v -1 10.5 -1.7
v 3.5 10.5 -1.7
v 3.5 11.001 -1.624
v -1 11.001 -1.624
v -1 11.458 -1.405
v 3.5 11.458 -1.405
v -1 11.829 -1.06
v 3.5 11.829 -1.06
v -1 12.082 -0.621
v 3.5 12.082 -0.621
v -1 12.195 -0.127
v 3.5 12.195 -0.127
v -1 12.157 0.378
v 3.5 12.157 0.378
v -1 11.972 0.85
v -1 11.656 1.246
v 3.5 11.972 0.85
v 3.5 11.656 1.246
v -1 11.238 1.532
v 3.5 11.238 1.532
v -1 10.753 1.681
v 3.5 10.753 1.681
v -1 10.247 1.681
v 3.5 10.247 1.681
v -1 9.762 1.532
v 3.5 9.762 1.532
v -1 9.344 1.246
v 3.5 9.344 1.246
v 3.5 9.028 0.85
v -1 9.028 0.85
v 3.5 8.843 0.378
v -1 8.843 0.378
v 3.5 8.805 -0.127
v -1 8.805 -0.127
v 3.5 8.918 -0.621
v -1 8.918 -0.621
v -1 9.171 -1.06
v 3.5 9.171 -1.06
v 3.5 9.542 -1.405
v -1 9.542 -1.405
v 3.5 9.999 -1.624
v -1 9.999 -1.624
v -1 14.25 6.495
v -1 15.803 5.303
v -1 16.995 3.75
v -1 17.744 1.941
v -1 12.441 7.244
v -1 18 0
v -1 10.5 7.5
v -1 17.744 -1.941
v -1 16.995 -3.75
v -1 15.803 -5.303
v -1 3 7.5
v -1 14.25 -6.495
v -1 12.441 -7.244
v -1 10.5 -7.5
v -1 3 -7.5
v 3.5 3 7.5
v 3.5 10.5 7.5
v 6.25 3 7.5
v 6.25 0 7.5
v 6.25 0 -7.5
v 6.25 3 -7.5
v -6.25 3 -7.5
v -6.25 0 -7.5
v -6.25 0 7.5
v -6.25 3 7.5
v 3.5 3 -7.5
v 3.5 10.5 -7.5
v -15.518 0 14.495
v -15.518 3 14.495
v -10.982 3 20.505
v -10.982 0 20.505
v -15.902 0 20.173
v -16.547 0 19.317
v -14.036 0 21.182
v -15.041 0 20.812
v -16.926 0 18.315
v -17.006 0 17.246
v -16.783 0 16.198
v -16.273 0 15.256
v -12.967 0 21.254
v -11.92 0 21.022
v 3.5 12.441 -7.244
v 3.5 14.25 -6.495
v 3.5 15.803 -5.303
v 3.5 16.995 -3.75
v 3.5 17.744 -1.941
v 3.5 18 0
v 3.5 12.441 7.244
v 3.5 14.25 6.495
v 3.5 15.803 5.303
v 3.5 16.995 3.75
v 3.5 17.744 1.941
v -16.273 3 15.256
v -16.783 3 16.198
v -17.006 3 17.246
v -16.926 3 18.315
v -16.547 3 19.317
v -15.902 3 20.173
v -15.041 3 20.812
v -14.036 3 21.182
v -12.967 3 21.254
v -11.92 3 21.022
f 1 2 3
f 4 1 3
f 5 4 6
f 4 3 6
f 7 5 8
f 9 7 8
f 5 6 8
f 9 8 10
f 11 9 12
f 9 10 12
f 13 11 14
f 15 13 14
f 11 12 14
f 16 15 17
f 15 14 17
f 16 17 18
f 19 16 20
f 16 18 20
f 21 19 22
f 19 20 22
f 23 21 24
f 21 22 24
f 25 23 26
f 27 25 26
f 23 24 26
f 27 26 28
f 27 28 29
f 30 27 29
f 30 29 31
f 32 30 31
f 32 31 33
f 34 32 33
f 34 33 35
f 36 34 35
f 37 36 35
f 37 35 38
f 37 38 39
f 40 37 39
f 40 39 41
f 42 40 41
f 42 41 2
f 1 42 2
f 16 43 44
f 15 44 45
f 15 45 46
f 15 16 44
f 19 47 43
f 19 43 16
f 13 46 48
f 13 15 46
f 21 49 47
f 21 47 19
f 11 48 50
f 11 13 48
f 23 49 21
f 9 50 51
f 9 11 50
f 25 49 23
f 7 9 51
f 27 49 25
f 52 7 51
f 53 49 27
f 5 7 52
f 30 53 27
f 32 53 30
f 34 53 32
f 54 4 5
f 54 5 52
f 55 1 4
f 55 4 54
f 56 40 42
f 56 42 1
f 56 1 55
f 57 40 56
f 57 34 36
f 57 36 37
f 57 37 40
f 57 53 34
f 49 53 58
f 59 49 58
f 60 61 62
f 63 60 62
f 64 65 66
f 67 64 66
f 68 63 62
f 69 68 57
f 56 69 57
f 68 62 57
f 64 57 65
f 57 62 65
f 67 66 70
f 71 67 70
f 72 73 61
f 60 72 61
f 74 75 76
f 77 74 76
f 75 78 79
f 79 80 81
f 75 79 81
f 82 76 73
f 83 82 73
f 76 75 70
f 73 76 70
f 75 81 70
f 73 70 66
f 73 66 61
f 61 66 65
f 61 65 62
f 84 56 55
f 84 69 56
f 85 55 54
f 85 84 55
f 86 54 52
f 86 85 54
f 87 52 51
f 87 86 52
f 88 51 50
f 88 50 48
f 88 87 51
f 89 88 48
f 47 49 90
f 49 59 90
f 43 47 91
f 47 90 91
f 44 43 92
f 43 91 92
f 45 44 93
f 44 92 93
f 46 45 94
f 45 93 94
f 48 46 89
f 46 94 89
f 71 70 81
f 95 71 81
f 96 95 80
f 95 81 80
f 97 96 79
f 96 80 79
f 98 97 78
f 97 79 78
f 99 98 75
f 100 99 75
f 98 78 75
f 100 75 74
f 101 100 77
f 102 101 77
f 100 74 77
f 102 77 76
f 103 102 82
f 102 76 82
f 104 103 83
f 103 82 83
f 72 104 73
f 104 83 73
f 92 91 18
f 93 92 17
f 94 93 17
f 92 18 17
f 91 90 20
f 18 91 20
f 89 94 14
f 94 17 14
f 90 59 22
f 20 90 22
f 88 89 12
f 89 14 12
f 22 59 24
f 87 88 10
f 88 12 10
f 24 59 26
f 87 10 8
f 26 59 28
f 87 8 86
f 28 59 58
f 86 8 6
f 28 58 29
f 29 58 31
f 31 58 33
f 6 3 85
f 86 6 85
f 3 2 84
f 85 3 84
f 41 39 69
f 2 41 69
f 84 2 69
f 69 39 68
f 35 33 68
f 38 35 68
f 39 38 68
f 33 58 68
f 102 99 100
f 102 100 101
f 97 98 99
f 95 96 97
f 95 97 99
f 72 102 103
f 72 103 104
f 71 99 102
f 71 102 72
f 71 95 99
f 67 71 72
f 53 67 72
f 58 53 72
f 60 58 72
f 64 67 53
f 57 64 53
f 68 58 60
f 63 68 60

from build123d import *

# Parameters (mm, degrees)
BOSS_EXTRUDE1_DEPTH = 3
SKETCH2_W           = 4.5
SKETCH2_H           = 15
BOSS_EXTRUDE2_DEPTH = 15
CUT_EXTRUDE1_REACH  = 36.599
SKETCH3_R           = 1.7
FILLET1_R           = 7.5


with BuildPart() as part:
    # Sketch1 → Boss-Extrude1 (new body)
    with BuildSketch(Plane(origin=(0, 0, 0), x_dir=(1, 0, 0), z_dir=(0, 1, 0))):
        with BuildLine():
            Line((-6.25, -7.5), (-15.518088002, -14.494783398))
            ThreePointArc((-15.518088002, -14.494783398), (-16.255216602, -19.768088002), (-10.981911998, -20.505216602))
            Line((-10.981911998, -20.505216602), (6.25, -7.5))
            Line((6.25, -7.5), (6.25, 7.5))
            Line((6.25, 7.5), (-6.25, 7.5))
            Line((-6.25, 7.5), (-6.25, -7.5))
        make_face()
    extrude(amount=BOSS_EXTRUDE1_DEPTH)

    # Sketch2 → Boss-Extrude2 (add)
    with BuildSketch(Plane(origin=(0, 3, 0), x_dir=(1, 0, 0), z_dir=(0, 1, 0))):
        with Locations((1.25, 0)):
            Rectangle(SKETCH2_W, SKETCH2_H)
    extrude(amount=BOSS_EXTRUDE2_DEPTH)

    # Sketch3 → Cut-Extrude1 (cut, up to next)
    with BuildSketch(Plane(origin=(3.5, 0, 0), x_dir=(0, 0, -1), z_dir=(1, 0, 0)), mode=Mode.PRIVATE) as cut_extrude1_sk1:
        with Locations((0, 10.5)):
            Circle(SKETCH3_R)
    cut_extrude1_tool1 = extrude(cut_extrude1_sk1.sketch, amount=-CUT_EXTRUDE1_REACH, mode=Mode.PRIVATE) & part.part
    add(cut_extrude1_tool1.solids().sort_by_distance((3.5, 10.5, 0))[0], mode=Mode.SUBTRACT)

    # Fillet1
    fillet1_edges = [part.edges().sort_by_distance(p)[0] for p in [
        (1.25, 18, -7.5),
        (1.25, 18, 7.5),
    ]]
    fillet(fillet1_edges, radius=FILLET1_R - 0.0001)  # a hair under: the kernel refuses the full size


solid = part.part
